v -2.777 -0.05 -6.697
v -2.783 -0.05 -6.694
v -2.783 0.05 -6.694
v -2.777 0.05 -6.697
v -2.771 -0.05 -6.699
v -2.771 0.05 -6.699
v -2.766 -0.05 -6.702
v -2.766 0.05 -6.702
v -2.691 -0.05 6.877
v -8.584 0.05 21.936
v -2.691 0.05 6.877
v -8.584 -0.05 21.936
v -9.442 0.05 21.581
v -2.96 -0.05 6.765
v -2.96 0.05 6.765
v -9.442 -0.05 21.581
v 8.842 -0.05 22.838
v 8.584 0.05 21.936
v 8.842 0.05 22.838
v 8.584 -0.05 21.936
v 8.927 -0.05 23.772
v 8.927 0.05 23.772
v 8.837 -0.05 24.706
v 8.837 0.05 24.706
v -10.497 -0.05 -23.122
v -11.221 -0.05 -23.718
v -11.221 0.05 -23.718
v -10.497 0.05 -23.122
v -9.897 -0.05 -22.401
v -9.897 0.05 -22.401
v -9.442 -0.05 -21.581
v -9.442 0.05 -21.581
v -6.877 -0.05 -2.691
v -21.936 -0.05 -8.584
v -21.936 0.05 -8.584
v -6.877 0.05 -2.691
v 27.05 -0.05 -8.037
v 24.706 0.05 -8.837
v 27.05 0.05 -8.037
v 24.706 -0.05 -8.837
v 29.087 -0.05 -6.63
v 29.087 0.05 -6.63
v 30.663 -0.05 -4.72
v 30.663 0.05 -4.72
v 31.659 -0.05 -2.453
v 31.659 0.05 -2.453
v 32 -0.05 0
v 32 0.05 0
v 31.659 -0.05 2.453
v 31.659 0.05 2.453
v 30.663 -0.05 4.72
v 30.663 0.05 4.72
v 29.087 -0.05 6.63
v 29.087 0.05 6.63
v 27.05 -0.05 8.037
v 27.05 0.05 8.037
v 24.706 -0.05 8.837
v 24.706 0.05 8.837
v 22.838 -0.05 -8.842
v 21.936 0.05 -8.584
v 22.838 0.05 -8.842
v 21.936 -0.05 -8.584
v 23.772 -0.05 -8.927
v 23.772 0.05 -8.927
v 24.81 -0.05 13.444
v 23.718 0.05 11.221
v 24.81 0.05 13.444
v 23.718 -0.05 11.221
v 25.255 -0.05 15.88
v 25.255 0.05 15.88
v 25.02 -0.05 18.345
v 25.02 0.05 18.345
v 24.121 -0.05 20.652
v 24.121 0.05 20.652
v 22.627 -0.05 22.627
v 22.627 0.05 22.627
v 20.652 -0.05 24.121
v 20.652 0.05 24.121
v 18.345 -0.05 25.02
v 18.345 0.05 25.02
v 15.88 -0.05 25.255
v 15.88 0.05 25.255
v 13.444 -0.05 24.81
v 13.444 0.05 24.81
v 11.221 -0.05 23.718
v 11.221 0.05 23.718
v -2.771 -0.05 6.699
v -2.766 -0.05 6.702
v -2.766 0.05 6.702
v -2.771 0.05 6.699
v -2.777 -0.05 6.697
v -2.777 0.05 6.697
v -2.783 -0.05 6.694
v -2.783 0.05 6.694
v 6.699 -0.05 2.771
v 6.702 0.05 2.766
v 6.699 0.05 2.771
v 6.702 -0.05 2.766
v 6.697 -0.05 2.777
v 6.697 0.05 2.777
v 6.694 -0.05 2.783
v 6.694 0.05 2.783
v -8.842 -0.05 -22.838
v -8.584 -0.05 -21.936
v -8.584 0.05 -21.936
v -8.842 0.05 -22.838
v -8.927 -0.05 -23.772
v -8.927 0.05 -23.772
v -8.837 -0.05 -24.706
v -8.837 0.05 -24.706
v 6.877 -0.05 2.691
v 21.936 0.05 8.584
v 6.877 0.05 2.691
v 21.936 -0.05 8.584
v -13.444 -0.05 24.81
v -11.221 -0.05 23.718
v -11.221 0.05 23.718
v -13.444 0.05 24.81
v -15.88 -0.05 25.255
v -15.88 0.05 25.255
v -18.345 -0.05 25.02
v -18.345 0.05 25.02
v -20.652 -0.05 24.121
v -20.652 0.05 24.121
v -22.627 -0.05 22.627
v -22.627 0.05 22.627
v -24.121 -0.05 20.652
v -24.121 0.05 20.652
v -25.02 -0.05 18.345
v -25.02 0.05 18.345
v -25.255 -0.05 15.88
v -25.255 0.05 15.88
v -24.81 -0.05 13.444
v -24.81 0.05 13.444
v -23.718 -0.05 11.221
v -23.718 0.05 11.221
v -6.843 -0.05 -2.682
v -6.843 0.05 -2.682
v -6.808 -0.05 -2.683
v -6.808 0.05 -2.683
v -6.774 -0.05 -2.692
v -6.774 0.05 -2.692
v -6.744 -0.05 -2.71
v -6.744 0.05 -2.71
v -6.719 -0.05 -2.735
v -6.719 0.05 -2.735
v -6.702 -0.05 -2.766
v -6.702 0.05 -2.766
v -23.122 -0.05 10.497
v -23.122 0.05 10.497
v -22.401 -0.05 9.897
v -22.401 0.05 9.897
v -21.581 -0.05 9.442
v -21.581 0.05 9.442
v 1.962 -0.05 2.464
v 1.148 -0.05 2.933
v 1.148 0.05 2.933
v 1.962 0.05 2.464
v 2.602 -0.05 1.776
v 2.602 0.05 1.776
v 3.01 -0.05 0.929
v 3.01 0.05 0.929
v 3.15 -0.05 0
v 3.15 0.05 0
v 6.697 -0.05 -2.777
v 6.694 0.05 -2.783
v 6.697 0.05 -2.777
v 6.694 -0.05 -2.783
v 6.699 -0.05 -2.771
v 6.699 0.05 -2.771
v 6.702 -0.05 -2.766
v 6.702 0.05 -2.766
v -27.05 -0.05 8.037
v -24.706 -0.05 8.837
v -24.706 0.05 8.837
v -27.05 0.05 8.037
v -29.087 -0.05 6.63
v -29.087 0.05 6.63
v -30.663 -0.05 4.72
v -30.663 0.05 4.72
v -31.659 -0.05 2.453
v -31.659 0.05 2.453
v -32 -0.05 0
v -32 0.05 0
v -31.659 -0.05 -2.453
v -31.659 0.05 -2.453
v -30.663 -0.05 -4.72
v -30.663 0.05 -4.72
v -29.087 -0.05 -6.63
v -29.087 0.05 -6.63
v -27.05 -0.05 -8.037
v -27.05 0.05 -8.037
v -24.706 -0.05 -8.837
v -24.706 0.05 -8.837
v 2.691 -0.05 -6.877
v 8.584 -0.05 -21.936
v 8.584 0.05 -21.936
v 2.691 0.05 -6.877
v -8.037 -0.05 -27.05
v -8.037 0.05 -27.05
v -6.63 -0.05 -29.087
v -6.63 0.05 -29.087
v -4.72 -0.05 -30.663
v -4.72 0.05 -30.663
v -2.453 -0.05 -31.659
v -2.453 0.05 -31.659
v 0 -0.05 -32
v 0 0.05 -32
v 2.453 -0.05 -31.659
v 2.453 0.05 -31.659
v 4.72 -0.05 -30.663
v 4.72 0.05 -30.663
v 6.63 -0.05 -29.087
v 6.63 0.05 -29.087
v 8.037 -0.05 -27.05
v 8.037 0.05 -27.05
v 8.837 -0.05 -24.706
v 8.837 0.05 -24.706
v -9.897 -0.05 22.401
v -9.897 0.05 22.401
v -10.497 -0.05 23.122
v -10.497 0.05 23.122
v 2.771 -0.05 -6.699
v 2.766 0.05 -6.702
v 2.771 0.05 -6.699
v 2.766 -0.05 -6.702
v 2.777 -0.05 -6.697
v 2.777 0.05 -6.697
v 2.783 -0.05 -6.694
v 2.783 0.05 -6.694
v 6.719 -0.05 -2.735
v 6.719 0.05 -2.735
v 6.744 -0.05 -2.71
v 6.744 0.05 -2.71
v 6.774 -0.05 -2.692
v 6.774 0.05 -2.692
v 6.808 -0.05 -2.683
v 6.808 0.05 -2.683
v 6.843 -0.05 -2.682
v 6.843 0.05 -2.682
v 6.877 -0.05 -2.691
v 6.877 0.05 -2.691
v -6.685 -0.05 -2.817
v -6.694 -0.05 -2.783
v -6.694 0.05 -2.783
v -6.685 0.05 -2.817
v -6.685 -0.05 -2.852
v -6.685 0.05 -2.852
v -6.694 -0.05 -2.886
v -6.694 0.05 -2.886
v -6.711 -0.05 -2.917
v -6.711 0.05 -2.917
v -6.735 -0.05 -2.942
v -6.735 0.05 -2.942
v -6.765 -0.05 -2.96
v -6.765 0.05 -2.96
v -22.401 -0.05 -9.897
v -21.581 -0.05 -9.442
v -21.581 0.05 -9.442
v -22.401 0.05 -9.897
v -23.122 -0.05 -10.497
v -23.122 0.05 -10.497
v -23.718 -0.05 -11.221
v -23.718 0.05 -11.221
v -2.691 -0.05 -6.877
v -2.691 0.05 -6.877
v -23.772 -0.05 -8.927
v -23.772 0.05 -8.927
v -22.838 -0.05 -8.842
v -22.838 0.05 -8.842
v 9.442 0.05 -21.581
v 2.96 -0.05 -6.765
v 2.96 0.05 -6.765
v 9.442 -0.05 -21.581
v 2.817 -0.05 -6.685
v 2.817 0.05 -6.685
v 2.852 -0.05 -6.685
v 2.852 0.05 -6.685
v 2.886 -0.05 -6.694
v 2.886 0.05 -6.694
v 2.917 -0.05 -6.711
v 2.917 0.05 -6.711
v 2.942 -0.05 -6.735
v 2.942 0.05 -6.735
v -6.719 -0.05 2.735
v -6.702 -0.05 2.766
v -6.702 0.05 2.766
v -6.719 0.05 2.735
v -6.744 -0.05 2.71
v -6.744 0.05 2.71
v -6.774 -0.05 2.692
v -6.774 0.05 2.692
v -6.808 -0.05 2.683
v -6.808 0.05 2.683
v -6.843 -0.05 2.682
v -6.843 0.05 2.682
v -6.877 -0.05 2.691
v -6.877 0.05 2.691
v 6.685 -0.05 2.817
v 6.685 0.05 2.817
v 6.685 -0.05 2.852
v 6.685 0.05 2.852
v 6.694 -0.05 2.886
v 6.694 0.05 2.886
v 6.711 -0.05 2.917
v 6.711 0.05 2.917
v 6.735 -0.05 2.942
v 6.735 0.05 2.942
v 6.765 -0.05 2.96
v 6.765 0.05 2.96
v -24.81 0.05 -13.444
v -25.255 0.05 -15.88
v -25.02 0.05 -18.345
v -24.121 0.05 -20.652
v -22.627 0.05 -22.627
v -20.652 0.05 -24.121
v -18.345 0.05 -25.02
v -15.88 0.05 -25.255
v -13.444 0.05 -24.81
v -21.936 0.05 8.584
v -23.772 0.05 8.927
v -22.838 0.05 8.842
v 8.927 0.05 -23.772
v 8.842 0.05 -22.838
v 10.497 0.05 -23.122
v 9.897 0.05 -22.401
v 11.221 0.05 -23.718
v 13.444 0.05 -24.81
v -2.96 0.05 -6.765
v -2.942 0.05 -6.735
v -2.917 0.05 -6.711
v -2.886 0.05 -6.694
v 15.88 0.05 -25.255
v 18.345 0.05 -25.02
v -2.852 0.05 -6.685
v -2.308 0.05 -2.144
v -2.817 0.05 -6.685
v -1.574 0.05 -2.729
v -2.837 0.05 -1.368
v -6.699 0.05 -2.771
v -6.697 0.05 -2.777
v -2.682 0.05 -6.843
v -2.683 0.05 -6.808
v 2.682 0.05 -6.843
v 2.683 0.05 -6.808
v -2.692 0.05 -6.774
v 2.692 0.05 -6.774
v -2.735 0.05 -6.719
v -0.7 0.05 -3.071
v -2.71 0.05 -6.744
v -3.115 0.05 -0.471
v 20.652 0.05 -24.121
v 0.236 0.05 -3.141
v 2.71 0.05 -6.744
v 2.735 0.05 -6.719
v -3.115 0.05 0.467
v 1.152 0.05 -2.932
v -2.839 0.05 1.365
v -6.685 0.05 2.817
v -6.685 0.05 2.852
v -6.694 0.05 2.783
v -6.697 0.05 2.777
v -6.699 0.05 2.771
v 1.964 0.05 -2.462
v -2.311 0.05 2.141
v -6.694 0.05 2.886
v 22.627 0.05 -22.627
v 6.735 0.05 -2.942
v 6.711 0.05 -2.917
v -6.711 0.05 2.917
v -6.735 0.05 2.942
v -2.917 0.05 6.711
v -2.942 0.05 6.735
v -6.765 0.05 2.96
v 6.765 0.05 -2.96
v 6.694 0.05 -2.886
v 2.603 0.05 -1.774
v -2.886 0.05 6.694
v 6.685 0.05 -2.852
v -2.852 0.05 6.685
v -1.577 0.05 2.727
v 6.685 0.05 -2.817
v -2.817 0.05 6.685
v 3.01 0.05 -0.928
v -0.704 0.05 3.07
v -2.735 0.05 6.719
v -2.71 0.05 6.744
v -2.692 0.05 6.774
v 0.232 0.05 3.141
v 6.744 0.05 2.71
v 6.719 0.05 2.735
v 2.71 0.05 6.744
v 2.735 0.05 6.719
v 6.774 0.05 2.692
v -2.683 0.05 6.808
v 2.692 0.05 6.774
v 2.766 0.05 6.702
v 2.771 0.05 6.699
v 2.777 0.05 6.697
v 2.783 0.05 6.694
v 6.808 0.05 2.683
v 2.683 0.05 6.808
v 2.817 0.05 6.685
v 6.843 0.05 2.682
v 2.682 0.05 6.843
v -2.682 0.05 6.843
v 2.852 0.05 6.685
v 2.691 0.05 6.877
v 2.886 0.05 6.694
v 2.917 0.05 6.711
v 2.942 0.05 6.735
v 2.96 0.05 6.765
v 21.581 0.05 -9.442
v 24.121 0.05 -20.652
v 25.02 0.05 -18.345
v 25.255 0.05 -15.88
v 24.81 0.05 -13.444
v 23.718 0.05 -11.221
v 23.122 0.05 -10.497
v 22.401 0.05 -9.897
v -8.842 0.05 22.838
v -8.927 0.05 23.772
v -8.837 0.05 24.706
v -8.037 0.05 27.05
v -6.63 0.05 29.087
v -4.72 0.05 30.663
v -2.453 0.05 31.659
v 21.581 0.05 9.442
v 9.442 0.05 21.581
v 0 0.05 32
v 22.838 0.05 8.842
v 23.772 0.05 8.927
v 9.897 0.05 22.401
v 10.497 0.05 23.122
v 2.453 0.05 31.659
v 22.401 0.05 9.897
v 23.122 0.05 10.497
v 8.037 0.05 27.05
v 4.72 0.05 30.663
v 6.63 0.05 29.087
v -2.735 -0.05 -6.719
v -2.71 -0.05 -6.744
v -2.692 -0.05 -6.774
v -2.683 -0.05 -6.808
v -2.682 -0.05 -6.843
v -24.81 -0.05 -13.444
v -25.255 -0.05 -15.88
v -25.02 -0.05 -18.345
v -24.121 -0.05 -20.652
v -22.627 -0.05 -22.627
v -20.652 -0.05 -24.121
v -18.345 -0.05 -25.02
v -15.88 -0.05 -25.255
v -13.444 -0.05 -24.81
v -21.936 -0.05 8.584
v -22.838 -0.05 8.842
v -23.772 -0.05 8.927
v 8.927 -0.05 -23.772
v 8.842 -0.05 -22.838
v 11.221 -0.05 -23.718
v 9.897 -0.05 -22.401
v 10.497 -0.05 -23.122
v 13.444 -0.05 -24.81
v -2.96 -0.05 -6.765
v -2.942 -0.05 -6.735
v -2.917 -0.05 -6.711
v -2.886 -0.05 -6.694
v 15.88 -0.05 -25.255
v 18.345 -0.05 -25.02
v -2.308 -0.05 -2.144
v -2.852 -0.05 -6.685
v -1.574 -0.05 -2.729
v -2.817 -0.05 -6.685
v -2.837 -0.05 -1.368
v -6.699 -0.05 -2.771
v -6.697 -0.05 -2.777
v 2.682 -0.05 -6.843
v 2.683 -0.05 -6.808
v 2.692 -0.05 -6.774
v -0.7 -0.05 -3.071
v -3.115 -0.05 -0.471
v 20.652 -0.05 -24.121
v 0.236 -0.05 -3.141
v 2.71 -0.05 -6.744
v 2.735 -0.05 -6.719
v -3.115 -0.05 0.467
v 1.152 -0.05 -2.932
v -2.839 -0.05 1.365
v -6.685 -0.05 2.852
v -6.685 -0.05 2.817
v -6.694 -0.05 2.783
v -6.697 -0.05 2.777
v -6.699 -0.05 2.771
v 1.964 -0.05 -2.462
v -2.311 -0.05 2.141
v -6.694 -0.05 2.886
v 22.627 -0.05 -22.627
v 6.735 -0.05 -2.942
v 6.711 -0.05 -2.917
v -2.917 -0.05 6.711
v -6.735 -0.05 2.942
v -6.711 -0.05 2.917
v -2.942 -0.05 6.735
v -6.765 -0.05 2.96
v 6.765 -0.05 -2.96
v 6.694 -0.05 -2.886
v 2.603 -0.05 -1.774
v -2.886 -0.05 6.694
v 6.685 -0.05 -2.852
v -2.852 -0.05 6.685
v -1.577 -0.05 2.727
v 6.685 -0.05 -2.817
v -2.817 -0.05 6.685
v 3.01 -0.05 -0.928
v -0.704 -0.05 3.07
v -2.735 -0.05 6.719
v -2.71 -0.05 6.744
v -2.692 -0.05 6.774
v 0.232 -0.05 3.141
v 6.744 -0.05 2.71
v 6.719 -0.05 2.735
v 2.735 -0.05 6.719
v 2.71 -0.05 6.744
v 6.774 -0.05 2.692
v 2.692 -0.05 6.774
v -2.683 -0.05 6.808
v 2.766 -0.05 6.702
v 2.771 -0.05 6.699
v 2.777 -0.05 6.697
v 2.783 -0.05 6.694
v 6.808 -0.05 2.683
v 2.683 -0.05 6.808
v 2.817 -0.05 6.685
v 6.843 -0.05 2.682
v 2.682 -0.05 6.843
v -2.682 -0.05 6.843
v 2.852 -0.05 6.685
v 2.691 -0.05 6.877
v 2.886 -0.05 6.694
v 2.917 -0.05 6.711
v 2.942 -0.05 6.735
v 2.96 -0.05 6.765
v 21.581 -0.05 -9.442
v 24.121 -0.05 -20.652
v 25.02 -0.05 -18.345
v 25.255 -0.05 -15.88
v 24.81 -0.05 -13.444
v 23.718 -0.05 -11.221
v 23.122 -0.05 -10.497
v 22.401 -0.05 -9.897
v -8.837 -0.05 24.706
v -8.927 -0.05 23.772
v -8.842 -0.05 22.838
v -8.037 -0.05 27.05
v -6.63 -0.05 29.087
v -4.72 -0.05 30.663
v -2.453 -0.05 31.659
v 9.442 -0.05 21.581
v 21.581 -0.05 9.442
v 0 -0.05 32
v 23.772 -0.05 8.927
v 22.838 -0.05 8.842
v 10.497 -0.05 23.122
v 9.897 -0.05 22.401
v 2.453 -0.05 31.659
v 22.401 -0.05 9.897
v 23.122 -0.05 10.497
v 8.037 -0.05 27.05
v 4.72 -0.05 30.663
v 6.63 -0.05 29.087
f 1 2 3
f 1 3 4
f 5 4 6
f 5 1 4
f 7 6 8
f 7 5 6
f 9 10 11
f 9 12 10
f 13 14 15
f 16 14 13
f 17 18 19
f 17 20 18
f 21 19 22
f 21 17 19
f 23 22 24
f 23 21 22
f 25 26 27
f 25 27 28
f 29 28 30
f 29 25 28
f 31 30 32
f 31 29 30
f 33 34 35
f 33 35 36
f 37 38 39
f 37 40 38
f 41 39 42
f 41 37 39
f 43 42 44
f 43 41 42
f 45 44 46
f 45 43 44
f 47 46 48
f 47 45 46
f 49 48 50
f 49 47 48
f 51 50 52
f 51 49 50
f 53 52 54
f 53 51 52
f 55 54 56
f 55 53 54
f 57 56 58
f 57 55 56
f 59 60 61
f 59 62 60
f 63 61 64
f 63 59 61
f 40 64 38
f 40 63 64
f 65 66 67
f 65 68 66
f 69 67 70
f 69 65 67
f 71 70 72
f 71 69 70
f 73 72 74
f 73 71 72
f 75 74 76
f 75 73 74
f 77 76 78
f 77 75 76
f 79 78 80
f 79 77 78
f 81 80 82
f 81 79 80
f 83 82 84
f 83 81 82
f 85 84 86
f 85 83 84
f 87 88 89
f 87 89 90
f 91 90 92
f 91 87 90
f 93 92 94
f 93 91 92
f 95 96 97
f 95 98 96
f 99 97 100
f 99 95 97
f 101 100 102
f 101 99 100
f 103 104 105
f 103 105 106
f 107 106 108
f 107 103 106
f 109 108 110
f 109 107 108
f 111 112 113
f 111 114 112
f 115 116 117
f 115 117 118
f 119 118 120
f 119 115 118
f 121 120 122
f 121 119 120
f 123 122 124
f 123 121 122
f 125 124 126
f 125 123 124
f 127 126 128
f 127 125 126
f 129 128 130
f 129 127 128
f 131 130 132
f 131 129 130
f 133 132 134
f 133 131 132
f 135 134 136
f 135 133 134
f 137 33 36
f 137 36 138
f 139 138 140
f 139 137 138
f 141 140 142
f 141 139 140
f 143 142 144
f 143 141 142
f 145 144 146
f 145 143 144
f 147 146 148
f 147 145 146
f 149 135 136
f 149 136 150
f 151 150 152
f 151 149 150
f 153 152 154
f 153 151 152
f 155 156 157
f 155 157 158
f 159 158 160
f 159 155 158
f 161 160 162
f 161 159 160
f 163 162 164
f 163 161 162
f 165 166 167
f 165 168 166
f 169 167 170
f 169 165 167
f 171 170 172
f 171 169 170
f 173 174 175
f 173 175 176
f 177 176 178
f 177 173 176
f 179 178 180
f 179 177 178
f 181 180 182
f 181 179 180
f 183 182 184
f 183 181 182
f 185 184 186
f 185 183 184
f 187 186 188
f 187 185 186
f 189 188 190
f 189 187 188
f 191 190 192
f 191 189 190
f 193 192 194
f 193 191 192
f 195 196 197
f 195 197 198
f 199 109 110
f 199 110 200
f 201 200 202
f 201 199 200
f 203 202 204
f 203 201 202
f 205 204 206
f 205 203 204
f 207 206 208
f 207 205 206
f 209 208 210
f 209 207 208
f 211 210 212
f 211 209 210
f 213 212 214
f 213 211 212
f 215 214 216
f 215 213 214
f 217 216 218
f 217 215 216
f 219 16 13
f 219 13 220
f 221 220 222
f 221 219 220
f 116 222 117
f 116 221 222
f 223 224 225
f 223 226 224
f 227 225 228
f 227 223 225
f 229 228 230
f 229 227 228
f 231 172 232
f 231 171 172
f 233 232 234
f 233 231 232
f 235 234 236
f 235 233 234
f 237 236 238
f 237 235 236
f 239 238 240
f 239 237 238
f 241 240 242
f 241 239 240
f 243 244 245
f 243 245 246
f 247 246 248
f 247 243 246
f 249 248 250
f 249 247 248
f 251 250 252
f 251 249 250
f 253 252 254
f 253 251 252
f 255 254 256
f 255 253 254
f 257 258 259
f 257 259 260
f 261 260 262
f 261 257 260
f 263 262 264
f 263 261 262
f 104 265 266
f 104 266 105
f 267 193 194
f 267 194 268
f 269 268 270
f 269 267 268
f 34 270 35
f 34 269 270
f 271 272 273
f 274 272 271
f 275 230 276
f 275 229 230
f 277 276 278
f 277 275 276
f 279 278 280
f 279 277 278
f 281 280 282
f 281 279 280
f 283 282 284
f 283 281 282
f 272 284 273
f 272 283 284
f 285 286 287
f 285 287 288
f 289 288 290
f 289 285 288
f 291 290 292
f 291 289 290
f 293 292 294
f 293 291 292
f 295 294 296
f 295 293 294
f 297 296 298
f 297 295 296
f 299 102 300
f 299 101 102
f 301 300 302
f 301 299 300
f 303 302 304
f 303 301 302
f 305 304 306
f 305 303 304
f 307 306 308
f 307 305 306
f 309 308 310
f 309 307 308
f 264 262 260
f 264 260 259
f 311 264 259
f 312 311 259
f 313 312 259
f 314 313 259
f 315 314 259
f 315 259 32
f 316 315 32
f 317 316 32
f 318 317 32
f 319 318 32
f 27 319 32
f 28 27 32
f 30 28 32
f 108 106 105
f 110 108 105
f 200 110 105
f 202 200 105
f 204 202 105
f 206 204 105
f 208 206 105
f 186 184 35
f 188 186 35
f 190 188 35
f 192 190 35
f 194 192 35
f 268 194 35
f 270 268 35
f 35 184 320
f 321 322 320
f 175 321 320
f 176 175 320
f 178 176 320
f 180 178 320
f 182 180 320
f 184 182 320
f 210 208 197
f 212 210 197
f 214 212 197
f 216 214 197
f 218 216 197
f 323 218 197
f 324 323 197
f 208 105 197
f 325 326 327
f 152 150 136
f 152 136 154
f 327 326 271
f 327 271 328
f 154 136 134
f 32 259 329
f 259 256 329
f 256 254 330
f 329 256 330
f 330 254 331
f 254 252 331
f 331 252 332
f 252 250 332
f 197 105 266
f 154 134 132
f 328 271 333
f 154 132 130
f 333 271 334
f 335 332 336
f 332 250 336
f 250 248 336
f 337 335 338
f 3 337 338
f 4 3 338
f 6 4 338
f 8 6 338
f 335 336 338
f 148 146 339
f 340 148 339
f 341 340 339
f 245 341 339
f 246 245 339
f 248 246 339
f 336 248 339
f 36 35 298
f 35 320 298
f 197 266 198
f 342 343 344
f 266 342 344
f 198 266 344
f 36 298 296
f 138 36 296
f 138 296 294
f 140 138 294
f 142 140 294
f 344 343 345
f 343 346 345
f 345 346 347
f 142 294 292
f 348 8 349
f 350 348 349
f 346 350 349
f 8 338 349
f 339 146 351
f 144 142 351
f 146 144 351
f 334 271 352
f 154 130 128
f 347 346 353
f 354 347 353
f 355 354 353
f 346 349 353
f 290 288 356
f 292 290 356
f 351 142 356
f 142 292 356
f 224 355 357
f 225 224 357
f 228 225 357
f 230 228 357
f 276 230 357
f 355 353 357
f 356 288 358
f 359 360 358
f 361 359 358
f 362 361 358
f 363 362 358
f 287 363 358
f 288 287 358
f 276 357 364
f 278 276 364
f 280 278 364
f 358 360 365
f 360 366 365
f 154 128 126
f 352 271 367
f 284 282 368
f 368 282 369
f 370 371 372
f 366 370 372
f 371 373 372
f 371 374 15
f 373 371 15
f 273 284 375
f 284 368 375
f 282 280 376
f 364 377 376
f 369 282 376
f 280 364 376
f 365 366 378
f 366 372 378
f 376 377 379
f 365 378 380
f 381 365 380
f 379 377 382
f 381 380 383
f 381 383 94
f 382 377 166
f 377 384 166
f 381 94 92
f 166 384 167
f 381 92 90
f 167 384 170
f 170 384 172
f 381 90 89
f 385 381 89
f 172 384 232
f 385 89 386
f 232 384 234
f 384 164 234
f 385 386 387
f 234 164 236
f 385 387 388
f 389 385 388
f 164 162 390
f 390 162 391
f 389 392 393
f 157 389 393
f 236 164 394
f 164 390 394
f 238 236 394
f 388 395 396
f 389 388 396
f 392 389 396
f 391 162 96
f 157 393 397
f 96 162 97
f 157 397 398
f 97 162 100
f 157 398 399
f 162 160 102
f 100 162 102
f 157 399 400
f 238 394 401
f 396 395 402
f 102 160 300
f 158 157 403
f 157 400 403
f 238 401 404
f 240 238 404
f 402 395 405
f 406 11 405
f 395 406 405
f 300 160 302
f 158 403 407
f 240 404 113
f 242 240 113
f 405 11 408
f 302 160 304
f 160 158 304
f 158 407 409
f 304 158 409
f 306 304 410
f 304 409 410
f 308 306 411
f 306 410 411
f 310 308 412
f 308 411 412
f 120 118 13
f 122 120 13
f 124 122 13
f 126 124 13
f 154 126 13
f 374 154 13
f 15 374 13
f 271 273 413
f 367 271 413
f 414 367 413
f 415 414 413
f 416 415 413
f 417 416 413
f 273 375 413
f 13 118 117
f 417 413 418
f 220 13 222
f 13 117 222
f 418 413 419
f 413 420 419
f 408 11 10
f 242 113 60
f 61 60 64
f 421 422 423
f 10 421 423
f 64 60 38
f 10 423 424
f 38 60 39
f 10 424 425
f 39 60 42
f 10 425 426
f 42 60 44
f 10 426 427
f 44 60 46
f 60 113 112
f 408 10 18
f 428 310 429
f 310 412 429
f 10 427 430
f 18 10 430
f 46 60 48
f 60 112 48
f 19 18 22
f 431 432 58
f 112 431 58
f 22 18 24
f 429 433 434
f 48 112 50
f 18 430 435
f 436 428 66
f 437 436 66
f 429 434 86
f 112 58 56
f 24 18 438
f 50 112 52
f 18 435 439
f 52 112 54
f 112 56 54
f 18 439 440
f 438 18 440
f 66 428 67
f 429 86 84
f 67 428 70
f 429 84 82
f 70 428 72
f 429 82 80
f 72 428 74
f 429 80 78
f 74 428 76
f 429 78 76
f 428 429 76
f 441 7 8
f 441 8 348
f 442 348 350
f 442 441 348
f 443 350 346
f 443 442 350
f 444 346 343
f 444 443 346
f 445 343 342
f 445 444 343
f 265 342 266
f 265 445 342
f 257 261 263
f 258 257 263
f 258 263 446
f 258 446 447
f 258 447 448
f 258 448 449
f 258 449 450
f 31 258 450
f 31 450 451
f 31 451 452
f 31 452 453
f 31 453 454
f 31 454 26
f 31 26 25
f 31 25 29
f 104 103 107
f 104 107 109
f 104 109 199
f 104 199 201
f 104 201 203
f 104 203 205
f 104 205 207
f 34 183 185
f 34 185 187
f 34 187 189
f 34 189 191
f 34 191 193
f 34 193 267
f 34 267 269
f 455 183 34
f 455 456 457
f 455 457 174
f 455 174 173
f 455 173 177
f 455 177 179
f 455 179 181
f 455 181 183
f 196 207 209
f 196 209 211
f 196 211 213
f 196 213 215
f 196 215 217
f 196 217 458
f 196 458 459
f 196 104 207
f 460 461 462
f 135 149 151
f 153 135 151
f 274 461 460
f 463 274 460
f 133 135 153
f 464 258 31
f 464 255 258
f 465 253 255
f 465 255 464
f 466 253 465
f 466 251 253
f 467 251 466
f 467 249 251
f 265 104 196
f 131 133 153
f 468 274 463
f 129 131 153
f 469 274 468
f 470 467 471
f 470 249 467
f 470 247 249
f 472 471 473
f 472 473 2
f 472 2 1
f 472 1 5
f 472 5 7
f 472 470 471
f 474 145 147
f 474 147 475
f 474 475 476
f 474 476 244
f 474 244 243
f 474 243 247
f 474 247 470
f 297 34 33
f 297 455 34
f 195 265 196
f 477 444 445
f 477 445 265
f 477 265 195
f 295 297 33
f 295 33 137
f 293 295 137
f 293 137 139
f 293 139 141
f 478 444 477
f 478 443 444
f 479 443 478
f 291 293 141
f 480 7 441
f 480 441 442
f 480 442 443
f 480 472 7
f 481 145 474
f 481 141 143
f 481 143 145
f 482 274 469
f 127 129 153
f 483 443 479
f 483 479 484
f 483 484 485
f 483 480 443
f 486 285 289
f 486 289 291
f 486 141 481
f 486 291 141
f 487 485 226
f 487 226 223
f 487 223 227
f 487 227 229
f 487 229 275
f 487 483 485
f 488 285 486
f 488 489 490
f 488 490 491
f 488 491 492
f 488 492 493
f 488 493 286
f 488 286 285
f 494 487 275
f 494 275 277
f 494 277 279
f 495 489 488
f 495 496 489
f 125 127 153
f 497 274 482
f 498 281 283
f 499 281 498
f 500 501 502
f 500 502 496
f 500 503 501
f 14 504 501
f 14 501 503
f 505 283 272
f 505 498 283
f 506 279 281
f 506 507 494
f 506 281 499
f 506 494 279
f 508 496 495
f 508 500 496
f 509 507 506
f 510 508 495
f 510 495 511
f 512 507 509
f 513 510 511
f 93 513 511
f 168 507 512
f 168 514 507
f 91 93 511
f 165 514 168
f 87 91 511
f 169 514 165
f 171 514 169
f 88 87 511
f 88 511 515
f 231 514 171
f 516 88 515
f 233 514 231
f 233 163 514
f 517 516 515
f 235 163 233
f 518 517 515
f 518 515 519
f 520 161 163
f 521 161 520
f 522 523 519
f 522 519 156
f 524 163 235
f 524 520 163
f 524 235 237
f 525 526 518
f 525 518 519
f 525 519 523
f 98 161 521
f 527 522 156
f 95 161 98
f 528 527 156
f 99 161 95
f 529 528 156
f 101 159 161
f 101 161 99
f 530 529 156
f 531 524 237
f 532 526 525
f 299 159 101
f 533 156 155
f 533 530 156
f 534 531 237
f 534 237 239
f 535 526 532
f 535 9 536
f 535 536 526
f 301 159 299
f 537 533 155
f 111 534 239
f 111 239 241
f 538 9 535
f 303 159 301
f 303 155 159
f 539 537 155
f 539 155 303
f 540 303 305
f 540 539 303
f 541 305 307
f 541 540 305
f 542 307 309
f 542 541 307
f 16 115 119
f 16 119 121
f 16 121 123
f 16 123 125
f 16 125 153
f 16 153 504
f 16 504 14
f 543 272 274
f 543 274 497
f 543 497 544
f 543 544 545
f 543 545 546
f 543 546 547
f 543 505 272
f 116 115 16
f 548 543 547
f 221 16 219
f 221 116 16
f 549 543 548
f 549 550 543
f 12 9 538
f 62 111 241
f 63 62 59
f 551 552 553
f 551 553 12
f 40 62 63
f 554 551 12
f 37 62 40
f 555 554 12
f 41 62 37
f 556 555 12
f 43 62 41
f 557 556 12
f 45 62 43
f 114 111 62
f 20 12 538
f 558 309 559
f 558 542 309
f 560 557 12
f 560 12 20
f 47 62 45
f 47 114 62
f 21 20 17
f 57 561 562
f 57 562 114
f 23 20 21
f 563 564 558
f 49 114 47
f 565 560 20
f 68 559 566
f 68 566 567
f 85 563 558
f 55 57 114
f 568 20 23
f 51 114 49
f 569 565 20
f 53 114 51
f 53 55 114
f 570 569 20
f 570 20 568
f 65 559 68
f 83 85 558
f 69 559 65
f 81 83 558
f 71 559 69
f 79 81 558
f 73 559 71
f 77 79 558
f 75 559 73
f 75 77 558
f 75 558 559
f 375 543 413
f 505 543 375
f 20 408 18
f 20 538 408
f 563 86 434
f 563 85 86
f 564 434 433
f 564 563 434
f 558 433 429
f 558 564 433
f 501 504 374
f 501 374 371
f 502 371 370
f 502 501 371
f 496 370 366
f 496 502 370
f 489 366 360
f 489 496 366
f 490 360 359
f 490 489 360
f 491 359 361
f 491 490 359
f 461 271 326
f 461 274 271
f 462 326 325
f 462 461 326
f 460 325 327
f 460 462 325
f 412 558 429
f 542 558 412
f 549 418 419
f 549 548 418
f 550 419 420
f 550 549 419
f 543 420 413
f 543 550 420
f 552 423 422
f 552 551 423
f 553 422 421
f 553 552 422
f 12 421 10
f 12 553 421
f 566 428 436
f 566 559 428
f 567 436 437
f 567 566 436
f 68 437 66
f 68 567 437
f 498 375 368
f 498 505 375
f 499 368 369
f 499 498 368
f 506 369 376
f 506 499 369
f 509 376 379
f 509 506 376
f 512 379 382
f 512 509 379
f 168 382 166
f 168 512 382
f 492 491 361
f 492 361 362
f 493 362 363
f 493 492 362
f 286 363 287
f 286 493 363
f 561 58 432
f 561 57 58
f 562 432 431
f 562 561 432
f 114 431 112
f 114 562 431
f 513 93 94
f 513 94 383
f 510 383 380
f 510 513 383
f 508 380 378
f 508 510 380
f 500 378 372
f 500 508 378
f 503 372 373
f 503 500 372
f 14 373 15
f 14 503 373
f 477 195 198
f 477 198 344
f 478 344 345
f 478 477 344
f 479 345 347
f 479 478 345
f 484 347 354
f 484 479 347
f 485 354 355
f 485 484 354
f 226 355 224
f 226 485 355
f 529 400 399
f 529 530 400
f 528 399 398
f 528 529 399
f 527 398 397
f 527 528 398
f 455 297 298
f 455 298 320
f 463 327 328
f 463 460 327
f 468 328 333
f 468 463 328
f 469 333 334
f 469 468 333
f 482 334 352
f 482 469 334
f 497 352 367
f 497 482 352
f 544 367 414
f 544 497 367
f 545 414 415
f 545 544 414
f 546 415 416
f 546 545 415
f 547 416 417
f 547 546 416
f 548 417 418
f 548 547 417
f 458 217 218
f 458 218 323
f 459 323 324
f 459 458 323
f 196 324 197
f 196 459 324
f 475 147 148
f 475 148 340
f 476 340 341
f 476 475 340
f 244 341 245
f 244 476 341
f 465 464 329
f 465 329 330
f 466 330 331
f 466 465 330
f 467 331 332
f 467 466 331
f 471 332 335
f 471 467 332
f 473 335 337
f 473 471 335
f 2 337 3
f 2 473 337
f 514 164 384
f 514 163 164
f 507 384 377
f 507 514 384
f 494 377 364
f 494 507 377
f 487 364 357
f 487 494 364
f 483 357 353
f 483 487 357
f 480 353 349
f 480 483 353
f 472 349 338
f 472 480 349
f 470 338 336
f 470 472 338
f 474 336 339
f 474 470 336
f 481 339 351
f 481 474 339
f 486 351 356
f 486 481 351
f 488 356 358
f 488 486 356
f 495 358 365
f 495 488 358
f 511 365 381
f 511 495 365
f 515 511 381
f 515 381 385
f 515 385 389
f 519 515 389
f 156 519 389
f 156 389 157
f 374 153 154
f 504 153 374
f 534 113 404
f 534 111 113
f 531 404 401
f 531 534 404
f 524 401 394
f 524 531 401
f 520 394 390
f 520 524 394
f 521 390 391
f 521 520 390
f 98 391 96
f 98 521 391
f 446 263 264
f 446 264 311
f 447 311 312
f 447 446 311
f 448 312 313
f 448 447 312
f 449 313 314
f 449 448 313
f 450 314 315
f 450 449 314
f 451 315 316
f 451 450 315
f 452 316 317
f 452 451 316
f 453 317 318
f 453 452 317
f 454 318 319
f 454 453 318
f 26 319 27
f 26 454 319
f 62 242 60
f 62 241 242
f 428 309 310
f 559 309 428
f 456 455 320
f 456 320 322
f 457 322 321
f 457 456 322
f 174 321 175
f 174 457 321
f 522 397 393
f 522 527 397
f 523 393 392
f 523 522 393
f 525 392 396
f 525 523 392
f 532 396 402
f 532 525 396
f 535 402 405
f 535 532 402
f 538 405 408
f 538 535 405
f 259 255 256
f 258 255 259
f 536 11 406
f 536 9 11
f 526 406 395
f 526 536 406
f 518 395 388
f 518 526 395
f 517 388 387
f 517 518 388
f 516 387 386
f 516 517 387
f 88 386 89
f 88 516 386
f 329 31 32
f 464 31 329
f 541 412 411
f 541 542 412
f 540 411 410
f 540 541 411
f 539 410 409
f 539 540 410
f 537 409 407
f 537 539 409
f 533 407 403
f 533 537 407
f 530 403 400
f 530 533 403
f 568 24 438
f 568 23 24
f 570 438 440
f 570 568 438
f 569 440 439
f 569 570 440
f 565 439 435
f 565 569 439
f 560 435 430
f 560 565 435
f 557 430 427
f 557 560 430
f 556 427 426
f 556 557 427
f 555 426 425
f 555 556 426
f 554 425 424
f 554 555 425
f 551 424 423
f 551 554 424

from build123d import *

# Parameters (mm, degrees)
F1_DEPTH = 0.05


with BuildPart() as f1:
    # F0 (on Front) → F1 (new body, symmetric)
    with BuildSketch(Plane.XZ):
        with BuildLine():
            ThreePointArc((-2.690905, 6.876757), (-2.692458, 6.77403), (-2.765534, 6.701815))
            ThreePointArc((-2.765534, 6.701815), (-2.774455, 6.698127), (-2.783371, 6.694427))
            ThreePointArc((-2.783371, 6.694427), (-2.886107, 6.693818), (-2.959844, 6.765359))
            Line((-2.959844, 6.765359), (-9.441598, 21.580797))
            ThreePointArc((-9.441598, 21.580797), (-10.179713, 22.775744), (-11.221047, 23.71826))
            ThreePointArc((-11.221047, 23.71826), (-22.627417, 22.627417), (-23.71826, 11.221047))
            ThreePointArc((-23.71826, 11.221047), (-22.775744, 10.179713), (-21.580797, 9.441598))
            Line((-21.580797, 9.441598), (-6.765359, 2.959844))
            ThreePointArc((-6.765359, 2.959844), (-6.693818, 2.886107), (-6.694427, 2.783371))
            ThreePointArc((-6.694427, 2.783371), (-6.698127, 2.774455), (-6.701815, 2.765534))
            ThreePointArc((-6.701815, 2.765534), (-6.77403, 2.692458), (-6.876757, 2.690905))
            Line((-6.876757, 2.690905), (-21.936146, 8.583709))
            ThreePointArc((-21.936146, 8.583709), (-23.303027, 8.906739), (-24.705821, 8.836865))
            ThreePointArc((-24.705821, 8.836865), (-32, 0), (-24.705821, -8.836865))
            ThreePointArc((-24.705821, -8.836865), (-23.303027, -8.906739), (-21.936146, -8.583709))
            Line((-21.936146, -8.583709), (-6.876757, -2.690905))
            ThreePointArc((-6.876757, -2.690905), (-6.77403, -2.692458), (-6.701815, -2.765534))
            ThreePointArc((-6.701815, -2.765534), (-6.698127, -2.774455), (-6.694427, -2.783371))
            ThreePointArc((-6.694427, -2.783371), (-6.693818, -2.886107), (-6.765359, -2.959844))
            Line((-6.765359, -2.959844), (-21.580797, -9.441598))
            ThreePointArc((-21.580797, -9.441598), (-22.775744, -10.179713), (-23.71826, -11.221047))
            ThreePointArc((-23.71826, -11.221047), (-22.627417, -22.627417), (-11.221047, -23.71826))
            ThreePointArc((-11.221047, -23.71826), (-10.179713, -22.775744), (-9.441598, -21.580797))
            Line((-9.441598, -21.580797), (-2.959844, -6.765359))
            ThreePointArc((-2.959844, -6.765359), (-2.886107, -6.693818), (-2.783371, -6.694427))
            ThreePointArc((-2.783371, -6.694427), (-2.774455, -6.698127), (-2.765534, -6.701815))
            ThreePointArc((-2.765534, -6.701815), (-2.692458, -6.77403), (-2.690905, -6.876757))
            Line((-2.690905, -6.876757), (-8.583709, -21.936146))
            ThreePointArc((-8.583709, -21.936146), (-8.906739, -23.303027), (-8.836865, -24.705821))
            ThreePointArc((-8.836865, -24.705821), (0, -32), (8.836865, -24.705821))
            ThreePointArc((8.836865, -24.705821), (8.906739, -23.303027), (8.583709, -21.936146))
            Line((8.583709, -21.936146), (2.690905, -6.876757))
            ThreePointArc((2.690905, -6.876757), (2.692458, -6.77403), (2.765534, -6.701815))
            ThreePointArc((2.765534, -6.701815), (2.774455, -6.698127), (2.783371, -6.694427))
            ThreePointArc((2.783371, -6.694427), (2.886107, -6.693818), (2.959844, -6.765359))
            Line((2.959844, -6.765359), (9.441598, -21.580797))
            ThreePointArc((9.441598, -21.580797), (10.179713, -22.775744), (11.221047, -23.71826))
            ThreePointArc((11.221047, -23.71826), (22.627417, -22.627417), (23.71826, -11.221047))
            ThreePointArc((23.71826, -11.221047), (22.775744, -10.179713), (21.580797, -9.441598))
            Line((21.580797, -9.441598), (6.765359, -2.959844))
            ThreePointArc((6.765359, -2.959844), (6.693818, -2.886107), (6.694427, -2.783371))
            ThreePointArc((6.694427, -2.783371), (6.698127, -2.774455), (6.701815, -2.765534))
            ThreePointArc((6.701815, -2.765534), (6.77403, -2.692458), (6.876757, -2.690905))
            Line((6.876757, -2.690905), (21.936146, -8.583709))
            ThreePointArc((21.936146, -8.583709), (23.303027, -8.906739), (24.705821, -8.836865))
            ThreePointArc((24.705821, -8.836865), (32, 0), (24.705821, 8.836865))
            ThreePointArc((24.705821, 8.836865), (23.303027, 8.906739), (21.936146, 8.583709))
            Line((21.936146, 8.583709), (6.876757, 2.690905))
            ThreePointArc((6.876757, 2.690905), (6.77403, 2.692458), (6.701815, 2.765534))
            ThreePointArc((6.701815, 2.765534), (6.698127, 2.774455), (6.694427, 2.783371))
            ThreePointArc((6.694427, 2.783371), (6.693818, 2.886107), (6.765359, 2.959844))
            Line((6.765359, 2.959844), (21.580797, 9.441598))
            ThreePointArc((21.580797, 9.441598), (22.775744, 10.179713), (23.71826, 11.221047))
            ThreePointArc((23.71826, 11.221047), (22.627417, 22.627417), (11.221047, 23.71826))
            ThreePointArc((11.221047, 23.71826), (10.179713, 22.775744), (9.441598, 21.580797))
            Line((9.441598, 21.580797), (2.959844, 6.765359))
            ThreePointArc((2.959844, 6.765359), (2.886107, 6.693818), (2.783371, 6.694427))
            ThreePointArc((2.783371, 6.694427), (2.774455, 6.698127), (2.765534, 6.701815))
            ThreePointArc((2.765534, 6.701815), (2.692458, 6.77403), (2.690905, 6.876757))
            Line((2.690905, 6.876757), (8.583709, 21.936146))
            ThreePointArc((8.583709, 21.936146), (8.906739, 23.303027), (8.836865, 24.705821))
            ThreePointArc((8.836865, 24.705821), (0, 32), (-8.836865, 24.705821))
            ThreePointArc((-8.836865, 24.705821), (-8.906739, 23.303027), (-8.583709, 21.936146))
            Line((-8.583709, 21.936146), (-2.690905, 6.876757))
        make_face()
        with BuildLine():
            ThreePointArc((1.147858, 2.933415), (2.601754, 1.775774), (3.15, 0))
            ThreePointArc((3.15, 0), (-2.601754, -1.775774), (1.147858, 2.933415))
        make_face(mode=Mode.SUBTRACT)
    extrude(amount=F1_DEPTH, both=True)


solid = f1.part
